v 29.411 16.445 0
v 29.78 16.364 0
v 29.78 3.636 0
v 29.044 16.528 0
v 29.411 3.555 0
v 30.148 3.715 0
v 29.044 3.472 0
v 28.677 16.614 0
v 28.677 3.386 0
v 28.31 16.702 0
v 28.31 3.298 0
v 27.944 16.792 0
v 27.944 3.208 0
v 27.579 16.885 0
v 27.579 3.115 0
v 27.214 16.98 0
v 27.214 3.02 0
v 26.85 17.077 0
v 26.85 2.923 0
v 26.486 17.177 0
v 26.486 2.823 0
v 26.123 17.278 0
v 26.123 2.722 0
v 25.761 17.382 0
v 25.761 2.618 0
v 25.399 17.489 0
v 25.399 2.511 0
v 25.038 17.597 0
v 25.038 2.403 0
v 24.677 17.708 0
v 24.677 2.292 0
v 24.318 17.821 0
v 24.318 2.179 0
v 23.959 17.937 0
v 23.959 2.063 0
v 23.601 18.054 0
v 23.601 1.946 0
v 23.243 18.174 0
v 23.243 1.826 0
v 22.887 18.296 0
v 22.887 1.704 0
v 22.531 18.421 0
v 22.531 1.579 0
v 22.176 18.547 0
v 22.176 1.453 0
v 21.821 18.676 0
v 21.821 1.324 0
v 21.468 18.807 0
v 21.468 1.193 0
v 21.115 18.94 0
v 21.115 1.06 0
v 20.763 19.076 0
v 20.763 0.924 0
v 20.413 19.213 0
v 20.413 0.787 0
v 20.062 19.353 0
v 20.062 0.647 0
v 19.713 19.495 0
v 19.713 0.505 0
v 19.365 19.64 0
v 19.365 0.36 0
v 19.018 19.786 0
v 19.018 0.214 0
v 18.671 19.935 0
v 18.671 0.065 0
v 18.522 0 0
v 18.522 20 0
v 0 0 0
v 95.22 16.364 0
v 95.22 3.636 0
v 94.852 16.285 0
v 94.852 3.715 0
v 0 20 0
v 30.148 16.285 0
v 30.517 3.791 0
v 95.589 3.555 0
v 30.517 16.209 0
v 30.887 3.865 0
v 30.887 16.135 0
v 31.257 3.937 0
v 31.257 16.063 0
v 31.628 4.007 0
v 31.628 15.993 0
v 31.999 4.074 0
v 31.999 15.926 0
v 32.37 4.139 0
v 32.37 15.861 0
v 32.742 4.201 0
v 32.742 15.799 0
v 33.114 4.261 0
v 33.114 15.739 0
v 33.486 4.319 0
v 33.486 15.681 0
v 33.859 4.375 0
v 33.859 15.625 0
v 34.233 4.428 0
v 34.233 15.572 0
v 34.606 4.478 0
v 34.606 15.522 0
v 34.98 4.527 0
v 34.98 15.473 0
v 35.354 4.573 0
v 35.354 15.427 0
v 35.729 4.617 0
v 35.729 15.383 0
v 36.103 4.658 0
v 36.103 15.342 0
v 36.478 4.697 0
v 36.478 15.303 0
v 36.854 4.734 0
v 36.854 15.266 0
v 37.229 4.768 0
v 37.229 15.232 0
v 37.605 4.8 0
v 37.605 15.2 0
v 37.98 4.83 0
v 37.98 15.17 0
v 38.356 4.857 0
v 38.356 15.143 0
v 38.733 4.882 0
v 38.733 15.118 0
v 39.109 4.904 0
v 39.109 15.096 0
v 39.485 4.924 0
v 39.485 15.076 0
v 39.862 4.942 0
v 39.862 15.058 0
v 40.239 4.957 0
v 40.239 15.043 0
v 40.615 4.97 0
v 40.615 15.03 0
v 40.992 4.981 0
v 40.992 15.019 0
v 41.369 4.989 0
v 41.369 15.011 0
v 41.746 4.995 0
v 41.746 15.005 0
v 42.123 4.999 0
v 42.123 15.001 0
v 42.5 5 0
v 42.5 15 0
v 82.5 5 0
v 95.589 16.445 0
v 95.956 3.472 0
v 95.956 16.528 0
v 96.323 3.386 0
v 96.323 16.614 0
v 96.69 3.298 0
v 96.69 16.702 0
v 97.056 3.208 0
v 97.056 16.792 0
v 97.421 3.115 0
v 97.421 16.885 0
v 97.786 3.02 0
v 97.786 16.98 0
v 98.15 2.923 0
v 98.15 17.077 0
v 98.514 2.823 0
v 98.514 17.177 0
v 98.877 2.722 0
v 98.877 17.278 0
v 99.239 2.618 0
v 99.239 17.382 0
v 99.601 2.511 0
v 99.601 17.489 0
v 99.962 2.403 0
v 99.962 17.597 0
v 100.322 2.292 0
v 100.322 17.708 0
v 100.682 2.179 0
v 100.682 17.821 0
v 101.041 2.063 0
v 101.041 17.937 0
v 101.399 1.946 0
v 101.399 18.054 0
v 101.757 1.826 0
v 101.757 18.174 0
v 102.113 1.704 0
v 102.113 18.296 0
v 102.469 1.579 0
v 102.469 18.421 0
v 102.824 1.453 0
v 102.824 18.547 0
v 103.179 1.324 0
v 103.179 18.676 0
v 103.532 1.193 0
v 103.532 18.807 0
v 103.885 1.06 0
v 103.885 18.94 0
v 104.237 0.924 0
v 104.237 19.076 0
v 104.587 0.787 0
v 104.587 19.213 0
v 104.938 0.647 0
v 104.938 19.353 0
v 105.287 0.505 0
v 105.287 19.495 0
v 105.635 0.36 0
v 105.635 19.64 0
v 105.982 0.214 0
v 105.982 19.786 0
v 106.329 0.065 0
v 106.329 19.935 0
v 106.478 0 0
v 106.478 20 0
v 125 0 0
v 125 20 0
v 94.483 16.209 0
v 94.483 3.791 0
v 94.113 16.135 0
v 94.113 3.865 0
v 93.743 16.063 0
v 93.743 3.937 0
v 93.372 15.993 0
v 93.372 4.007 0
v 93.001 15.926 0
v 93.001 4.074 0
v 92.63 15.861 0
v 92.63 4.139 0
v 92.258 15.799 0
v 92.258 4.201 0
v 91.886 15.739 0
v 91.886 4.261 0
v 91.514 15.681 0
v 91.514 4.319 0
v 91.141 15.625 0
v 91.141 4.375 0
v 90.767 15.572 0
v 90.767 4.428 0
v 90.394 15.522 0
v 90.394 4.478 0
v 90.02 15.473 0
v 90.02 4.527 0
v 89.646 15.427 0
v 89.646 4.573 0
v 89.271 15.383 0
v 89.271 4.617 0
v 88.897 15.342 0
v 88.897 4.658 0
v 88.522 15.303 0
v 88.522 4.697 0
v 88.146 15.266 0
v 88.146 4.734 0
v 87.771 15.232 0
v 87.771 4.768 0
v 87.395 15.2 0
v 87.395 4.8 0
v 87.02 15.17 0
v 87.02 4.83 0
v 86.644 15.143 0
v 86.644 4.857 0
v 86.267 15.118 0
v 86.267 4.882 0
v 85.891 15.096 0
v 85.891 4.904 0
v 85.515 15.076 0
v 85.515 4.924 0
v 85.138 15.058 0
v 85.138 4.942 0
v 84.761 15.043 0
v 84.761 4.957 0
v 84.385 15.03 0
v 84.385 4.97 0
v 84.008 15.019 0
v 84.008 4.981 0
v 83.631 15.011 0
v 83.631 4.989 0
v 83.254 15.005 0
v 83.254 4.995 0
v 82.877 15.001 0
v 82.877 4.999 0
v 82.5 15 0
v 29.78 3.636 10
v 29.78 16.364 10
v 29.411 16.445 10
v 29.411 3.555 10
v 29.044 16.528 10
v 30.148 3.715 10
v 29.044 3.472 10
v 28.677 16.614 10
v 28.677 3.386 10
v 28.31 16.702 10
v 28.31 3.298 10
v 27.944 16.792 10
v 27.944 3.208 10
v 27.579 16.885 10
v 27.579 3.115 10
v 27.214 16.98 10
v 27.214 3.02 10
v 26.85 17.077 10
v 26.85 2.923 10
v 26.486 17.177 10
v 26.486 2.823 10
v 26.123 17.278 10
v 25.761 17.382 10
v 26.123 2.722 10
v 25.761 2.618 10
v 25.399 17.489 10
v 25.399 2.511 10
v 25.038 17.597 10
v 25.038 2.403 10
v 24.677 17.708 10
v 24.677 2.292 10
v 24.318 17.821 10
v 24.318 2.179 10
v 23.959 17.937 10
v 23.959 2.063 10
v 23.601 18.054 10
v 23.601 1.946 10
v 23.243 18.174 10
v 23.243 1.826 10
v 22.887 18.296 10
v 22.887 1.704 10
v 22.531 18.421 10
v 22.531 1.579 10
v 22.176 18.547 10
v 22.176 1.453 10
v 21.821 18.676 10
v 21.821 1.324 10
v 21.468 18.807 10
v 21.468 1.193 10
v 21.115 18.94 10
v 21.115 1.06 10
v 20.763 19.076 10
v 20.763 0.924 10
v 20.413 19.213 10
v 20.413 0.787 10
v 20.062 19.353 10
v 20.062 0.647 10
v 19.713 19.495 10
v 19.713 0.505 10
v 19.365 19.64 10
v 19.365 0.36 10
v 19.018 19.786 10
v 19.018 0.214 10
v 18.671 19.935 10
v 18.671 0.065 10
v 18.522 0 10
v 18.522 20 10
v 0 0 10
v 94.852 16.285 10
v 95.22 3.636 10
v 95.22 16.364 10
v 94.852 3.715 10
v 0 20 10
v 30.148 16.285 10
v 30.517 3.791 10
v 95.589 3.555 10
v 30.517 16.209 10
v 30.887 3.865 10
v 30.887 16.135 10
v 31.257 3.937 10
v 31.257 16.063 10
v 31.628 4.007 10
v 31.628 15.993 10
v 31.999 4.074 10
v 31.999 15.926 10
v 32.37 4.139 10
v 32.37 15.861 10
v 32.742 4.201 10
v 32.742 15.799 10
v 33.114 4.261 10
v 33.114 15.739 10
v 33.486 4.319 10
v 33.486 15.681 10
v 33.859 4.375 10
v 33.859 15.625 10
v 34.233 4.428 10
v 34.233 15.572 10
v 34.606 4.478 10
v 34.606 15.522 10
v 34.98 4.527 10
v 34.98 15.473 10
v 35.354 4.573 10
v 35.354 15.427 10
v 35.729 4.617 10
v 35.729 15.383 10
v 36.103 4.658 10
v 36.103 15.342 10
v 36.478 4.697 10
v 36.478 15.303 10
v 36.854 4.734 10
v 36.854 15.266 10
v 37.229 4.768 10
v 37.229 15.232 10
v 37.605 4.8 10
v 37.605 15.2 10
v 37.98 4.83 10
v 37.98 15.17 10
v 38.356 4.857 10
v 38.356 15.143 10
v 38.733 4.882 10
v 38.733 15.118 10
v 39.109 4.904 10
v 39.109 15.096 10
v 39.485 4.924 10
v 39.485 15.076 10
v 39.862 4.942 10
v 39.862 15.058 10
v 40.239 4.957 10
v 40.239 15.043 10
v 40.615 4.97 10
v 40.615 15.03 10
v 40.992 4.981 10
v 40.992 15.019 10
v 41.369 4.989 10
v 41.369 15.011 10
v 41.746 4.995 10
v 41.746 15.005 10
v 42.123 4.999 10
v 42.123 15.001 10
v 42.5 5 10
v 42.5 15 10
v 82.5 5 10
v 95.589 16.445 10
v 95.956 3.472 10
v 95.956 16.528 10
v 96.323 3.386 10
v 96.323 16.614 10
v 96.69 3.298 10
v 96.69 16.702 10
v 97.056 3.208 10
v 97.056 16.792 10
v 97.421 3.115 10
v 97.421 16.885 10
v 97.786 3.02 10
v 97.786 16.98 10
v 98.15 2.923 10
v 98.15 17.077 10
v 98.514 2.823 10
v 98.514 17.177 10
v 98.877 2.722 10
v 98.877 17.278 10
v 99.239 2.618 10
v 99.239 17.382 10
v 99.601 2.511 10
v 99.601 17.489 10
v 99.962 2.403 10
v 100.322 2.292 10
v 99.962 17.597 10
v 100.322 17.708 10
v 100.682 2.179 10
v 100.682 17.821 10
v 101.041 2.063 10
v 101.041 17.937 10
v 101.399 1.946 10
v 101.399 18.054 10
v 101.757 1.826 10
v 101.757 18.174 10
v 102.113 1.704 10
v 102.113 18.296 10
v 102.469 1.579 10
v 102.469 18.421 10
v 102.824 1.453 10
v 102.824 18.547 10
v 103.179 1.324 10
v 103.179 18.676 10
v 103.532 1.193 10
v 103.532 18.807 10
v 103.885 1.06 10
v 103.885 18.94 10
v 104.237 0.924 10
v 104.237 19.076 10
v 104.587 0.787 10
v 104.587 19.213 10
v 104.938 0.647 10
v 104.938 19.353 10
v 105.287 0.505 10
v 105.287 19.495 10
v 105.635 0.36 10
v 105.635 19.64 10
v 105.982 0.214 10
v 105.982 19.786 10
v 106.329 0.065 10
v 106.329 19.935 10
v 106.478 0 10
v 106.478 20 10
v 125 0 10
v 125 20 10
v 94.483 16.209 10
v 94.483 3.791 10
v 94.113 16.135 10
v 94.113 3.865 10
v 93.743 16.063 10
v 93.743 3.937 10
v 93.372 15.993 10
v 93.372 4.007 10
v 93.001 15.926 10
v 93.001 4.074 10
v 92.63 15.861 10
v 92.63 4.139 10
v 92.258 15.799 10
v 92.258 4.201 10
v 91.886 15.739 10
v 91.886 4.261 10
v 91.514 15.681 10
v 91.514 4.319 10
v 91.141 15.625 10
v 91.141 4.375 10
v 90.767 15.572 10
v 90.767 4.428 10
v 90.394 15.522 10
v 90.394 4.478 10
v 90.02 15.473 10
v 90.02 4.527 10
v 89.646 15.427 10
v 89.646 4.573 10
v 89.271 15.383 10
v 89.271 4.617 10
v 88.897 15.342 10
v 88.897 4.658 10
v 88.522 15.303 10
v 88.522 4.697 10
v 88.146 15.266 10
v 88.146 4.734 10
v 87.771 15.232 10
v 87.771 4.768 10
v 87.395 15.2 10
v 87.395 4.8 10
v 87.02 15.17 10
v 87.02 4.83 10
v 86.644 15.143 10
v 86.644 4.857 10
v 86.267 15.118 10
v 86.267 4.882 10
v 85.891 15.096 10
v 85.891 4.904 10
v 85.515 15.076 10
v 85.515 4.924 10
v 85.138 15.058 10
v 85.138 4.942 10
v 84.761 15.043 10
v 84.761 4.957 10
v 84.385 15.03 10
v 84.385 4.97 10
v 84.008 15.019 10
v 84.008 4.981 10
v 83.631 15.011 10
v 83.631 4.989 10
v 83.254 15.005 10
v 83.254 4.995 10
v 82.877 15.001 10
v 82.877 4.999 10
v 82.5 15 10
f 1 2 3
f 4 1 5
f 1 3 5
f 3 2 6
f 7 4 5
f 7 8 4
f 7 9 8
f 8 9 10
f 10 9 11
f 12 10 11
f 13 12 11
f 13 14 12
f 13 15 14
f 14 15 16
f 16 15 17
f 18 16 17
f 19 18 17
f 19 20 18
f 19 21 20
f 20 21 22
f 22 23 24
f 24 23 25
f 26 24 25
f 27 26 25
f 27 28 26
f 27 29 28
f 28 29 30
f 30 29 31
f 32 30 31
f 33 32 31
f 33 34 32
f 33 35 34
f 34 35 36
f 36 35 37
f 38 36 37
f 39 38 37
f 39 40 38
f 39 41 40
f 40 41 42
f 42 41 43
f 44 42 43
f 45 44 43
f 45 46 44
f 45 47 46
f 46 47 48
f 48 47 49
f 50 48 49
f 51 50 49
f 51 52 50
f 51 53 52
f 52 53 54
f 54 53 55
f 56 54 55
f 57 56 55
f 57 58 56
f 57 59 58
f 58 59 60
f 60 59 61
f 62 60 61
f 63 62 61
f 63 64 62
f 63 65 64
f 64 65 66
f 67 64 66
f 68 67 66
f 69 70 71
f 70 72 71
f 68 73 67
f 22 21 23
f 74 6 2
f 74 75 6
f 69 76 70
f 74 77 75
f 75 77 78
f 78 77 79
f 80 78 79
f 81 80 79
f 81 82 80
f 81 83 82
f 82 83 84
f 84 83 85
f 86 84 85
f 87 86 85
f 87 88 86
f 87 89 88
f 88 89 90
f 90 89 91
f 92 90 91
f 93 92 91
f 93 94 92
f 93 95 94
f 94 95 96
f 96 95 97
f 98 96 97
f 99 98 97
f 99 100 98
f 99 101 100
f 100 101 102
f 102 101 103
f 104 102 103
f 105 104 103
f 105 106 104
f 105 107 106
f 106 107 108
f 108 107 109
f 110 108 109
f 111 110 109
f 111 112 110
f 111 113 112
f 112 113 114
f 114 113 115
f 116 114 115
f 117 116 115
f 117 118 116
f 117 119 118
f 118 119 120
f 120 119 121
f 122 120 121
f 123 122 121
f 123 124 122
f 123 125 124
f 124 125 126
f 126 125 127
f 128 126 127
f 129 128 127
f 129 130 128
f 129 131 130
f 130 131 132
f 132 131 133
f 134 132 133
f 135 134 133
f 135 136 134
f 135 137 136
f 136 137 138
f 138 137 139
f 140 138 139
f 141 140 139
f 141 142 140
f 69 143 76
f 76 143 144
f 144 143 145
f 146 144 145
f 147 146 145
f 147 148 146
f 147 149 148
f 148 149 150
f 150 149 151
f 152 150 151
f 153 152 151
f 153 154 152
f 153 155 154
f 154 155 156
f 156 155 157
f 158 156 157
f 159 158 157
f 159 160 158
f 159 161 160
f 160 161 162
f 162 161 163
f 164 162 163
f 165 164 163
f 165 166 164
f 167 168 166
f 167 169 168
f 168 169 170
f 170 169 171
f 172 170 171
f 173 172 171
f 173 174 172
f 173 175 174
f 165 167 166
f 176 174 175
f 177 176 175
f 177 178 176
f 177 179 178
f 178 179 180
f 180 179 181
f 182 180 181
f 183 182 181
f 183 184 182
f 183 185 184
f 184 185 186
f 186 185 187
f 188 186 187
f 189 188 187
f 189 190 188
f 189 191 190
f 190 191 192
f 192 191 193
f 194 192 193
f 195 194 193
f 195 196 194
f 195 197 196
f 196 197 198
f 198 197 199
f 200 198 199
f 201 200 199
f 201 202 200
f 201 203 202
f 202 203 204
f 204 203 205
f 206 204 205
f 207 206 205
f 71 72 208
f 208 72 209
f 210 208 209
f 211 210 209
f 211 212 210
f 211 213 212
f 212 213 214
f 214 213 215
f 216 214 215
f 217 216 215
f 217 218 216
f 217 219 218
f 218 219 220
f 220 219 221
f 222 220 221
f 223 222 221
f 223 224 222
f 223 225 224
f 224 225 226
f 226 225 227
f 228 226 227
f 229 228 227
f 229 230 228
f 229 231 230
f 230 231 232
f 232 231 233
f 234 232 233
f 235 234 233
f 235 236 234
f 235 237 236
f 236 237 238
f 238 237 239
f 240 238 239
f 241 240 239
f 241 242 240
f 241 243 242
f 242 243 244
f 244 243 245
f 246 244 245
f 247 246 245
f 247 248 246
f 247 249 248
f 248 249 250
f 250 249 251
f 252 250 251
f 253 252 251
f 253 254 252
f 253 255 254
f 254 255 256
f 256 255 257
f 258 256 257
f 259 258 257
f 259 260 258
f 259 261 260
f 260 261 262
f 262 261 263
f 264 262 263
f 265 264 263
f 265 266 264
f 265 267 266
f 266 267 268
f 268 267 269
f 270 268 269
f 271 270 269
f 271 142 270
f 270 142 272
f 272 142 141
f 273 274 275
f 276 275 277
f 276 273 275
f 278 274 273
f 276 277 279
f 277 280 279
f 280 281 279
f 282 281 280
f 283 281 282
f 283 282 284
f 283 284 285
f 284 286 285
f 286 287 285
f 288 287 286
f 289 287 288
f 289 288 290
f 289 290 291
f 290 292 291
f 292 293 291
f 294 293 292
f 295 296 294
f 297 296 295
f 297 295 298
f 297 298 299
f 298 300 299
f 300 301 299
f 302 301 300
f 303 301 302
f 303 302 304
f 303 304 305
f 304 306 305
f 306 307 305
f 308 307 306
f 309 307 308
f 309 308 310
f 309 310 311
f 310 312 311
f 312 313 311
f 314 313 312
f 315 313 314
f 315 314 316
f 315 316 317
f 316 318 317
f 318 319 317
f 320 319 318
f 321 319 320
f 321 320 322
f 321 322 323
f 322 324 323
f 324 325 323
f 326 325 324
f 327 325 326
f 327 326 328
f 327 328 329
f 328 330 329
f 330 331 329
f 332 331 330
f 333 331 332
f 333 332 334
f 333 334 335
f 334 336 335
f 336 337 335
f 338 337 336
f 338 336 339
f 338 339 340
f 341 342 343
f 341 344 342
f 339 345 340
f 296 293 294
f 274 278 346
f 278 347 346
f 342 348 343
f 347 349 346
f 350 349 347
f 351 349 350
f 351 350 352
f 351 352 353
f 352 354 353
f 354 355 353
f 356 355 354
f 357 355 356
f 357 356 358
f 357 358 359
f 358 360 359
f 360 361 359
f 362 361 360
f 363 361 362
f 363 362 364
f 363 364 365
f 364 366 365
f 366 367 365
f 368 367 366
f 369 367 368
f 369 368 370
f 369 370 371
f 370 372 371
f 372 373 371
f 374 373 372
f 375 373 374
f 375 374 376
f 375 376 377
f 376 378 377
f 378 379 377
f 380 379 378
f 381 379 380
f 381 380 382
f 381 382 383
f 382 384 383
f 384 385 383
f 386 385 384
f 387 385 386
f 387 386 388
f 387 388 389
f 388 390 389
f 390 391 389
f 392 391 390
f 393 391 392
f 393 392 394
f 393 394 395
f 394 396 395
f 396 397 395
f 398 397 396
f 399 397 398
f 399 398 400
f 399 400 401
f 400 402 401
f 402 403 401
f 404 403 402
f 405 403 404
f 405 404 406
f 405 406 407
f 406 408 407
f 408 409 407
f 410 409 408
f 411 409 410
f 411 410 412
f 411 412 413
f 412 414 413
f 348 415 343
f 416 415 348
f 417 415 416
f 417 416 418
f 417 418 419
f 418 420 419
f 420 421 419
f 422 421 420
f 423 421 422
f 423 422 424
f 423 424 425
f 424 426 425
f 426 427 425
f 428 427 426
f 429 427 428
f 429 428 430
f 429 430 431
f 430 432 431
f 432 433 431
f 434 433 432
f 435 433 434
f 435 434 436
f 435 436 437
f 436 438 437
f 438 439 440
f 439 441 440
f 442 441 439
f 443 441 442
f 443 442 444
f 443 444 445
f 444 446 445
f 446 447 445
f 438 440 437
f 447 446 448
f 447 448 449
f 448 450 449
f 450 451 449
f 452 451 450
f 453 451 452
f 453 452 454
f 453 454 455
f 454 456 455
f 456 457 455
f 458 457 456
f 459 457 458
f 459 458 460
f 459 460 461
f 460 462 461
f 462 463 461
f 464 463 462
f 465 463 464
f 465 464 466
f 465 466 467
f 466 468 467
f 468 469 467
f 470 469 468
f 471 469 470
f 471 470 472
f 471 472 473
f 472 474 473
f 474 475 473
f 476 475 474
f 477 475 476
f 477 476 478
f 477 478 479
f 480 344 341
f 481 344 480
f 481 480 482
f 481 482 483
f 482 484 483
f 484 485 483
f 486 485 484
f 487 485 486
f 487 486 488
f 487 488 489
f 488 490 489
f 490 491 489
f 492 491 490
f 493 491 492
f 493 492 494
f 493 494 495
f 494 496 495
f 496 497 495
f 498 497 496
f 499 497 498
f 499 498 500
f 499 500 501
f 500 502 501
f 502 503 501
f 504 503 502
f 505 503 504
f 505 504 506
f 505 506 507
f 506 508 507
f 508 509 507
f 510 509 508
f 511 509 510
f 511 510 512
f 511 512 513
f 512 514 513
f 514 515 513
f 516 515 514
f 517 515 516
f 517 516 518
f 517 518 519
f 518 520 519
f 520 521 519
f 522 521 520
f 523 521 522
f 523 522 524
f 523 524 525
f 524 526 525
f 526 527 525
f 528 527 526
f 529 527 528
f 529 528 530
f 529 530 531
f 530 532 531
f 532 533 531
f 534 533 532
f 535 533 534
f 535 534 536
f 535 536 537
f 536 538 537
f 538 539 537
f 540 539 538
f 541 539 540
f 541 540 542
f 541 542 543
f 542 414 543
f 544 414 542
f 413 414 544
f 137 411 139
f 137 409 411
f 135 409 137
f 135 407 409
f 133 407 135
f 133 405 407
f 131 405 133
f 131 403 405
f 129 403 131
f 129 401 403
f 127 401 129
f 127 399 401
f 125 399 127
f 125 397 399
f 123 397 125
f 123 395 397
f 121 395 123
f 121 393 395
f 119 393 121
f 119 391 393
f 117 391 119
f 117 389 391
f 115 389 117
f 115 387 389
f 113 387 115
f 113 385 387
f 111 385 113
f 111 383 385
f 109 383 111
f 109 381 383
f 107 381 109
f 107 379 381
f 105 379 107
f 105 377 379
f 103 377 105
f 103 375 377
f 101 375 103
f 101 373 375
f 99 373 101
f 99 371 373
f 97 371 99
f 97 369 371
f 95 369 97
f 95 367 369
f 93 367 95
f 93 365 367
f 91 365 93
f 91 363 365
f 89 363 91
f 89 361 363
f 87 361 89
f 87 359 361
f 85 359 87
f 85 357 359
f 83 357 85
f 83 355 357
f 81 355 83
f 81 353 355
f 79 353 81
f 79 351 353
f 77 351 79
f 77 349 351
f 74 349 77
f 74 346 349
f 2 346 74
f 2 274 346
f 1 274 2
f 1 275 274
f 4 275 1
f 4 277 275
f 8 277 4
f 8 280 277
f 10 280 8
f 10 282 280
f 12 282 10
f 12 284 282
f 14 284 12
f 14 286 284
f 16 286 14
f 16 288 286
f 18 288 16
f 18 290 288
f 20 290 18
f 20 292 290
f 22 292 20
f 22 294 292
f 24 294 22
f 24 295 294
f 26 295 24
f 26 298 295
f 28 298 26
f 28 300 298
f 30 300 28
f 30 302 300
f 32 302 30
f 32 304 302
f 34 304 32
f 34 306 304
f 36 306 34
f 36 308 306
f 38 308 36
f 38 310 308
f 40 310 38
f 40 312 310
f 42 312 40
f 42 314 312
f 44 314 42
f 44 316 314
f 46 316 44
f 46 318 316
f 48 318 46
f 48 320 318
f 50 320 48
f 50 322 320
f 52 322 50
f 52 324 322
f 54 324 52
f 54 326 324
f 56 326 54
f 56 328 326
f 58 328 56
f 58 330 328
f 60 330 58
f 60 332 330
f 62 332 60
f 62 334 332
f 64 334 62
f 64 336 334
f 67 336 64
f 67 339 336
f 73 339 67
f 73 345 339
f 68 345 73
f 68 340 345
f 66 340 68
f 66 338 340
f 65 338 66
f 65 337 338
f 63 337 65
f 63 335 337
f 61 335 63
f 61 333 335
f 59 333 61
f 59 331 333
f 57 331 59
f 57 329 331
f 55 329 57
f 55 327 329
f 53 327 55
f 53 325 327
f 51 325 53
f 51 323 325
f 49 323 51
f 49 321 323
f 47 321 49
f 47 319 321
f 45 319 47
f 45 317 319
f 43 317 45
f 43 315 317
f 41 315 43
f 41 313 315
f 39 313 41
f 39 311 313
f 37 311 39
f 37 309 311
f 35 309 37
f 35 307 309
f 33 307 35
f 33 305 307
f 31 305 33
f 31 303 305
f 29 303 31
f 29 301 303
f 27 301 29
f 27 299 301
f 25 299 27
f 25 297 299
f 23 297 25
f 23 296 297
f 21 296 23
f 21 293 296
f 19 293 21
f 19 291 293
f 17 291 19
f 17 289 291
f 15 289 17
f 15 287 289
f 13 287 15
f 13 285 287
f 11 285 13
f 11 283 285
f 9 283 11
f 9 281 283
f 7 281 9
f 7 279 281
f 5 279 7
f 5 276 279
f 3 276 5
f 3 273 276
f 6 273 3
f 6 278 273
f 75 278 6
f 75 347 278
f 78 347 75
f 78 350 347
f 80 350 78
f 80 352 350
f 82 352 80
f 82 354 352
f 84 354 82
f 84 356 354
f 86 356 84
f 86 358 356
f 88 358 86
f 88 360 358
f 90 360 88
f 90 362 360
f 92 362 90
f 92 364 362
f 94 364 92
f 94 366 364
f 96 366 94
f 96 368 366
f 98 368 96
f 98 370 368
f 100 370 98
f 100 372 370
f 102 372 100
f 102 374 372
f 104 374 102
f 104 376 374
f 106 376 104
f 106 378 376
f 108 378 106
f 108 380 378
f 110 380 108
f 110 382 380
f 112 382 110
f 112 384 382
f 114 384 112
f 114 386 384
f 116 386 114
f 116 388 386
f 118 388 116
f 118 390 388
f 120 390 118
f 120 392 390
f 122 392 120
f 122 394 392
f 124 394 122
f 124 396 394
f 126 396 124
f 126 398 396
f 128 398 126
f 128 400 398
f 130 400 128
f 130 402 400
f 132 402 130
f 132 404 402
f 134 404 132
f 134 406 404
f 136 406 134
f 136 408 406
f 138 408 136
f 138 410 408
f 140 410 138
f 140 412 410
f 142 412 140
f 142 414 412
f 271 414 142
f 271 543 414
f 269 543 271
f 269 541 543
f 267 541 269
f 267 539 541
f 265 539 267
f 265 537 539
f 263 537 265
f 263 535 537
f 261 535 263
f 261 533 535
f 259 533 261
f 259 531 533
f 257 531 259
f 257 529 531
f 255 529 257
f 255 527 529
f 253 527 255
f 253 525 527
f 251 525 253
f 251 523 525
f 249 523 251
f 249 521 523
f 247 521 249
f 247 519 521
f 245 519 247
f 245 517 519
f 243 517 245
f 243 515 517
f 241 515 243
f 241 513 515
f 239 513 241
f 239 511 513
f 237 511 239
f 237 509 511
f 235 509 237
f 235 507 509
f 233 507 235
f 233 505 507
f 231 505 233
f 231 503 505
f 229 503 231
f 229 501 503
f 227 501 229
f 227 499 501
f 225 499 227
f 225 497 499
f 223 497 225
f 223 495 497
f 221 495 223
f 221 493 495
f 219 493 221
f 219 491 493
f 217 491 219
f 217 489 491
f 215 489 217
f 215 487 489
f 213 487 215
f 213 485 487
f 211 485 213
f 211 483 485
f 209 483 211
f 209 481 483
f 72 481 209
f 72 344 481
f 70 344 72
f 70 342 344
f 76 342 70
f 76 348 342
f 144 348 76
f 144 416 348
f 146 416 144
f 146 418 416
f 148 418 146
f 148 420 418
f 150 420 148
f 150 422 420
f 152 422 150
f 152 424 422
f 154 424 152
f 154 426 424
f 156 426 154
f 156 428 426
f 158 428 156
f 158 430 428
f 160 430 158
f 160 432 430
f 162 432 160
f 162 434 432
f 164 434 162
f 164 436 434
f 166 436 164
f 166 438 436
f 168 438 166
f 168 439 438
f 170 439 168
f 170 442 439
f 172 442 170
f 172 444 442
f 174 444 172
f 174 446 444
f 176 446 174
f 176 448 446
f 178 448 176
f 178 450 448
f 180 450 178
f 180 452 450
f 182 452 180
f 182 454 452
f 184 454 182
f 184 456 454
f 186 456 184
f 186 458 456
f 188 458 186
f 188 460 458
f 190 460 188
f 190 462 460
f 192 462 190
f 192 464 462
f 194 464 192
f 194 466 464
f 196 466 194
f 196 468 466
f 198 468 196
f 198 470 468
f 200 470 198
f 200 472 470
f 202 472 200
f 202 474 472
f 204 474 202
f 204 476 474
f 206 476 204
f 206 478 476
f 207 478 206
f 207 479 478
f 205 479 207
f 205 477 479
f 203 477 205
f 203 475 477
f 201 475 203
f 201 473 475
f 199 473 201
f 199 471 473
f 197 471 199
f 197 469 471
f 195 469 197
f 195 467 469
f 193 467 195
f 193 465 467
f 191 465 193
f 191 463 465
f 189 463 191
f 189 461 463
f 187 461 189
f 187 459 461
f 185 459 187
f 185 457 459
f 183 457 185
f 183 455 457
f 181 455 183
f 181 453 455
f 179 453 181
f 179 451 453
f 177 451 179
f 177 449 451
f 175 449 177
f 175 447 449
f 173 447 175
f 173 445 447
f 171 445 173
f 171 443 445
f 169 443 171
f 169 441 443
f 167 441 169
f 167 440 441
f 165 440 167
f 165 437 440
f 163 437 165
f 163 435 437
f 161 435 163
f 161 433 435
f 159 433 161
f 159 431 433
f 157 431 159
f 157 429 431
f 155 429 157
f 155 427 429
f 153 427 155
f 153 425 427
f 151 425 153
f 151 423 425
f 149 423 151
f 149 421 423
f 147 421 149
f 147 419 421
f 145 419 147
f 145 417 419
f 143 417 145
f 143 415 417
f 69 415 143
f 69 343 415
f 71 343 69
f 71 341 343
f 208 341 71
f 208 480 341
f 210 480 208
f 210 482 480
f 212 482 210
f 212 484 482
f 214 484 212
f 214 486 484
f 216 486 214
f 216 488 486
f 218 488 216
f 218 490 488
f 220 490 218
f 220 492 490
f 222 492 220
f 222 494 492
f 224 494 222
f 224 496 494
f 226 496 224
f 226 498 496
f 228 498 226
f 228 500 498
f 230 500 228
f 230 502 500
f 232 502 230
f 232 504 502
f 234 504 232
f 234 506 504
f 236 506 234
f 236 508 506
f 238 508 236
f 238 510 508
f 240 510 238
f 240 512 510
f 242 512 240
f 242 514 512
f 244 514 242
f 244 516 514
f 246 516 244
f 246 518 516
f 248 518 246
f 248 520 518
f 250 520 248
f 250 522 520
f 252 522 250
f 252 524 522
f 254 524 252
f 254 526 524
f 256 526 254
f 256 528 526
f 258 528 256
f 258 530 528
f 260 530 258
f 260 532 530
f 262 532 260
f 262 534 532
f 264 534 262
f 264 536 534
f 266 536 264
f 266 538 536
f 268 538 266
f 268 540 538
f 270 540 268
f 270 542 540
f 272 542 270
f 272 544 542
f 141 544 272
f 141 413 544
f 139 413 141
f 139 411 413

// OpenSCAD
// file: iso3167.scad
iso3167_A = [
    "l1", 80,
    "l2", (104+113)/2,
    "l3", 170,
    "b1", 10,
    "b2", 20.0,
    "r", 24,
    "h", 4.0
];

iso3167_B = [
    "l1", 60.0,
    "l2", (106+110)/2,
    "l3", 150,
    "b1", 10,
    "b2", 20.0,
    "r", 60.0,
    "h", 4.0
];

function hash(h, k)=
(
    h[search([k], [for(i=[0:2:len(h)-2])h[i]])[0]*2+1]
);

module iso3167(
    l1 = undef,
    l2 = undef,
    l3 = undef,
    b1 = undef,
    b2 = undef,
    r = undef,
    h = undef,
    type = "A") {

    m_l1 = (l1 != undef) ? l1 : (type=="A" ? hash(iso3167_A,"l1") : type=="B" ? hash(iso3167_B, "l1") : undef);
    m_l2_max = (l2 != undef) ? l2 : (type=="A" ? hash(iso3167_A,"l2") : type=="B" ? hash(iso3167_B, "l2") : undef);
    m_l3 = (l3 != undef) ? l3 : (type=="A" ? hash(iso3167_A,"l3") : type=="B" ? hash(iso3167_B, "l3") : undef);
    m_b1 = (b1 != undef) ? b1 : (type=="A" ? hash(iso3167_A,"b1") : type=="B" ? hash(iso3167_B, "b1") : undef);
    m_b2 = (b2 != undef) ? b2 : (type=="A" ? hash(iso3167_A,"b2") : type=="B" ? hash(iso3167_B, "b2") : undef);
    m_r = (r != undef) ? r : (type=="A" ? hash(iso3167_A,"r") : type=="B" ? hash(iso3167_B, "r") : undef);
    m_h = (h != undef) ? h : (type=="A" ? hash(iso3167_A,"h") : type=="B" ? hash(iso3167_B, "h") : undef);

    neck_cut_width = (m_b2 - m_b1)/2;

    theta = acos((m_r - neck_cut_width)/m_r);
    fillet_width = sin(theta);
    m_l2 = ((m_l2_max - m_l1)/2 >= fillet_width) ? m_l2_max : m_l3 - 2*fillet_width ;

    neck_cut_xoff = (m_l3 - m_l1)/2;
    neck_cut_yoff = (m_b2 - neck_cut_width);

    neck_fillet_xoff1 = neck_cut_xoff;
    neck_fillet_xoff2 = m_l3 - neck_cut_xoff;
    neck_fillet_yoff1 = -m_r + neck_cut_width;
    neck_fillet_yoff2 = neck_cut_yoff + m_r;


    linear_extrude(height=m_h) {
        difference() {
            // Bounding rectangle
            square([m_l3, m_b2]);

            // Neck area
            translate([neck_cut_xoff, 0])
                square([m_l1, neck_cut_width]);
            translate([neck_cut_xoff, neck_cut_yoff])
                square([m_l1, neck_cut_width]);


            translate([neck_fillet_xoff1, neck_fillet_yoff1])
                circle(r=m_r);
            translate([neck_fillet_xoff1, neck_fillet_yoff2])
                circle(r=m_r);
            translate([neck_fillet_xoff2, neck_fillet_yoff1])
                circle(r=m_r);
            translate([neck_fillet_xoff2, neck_fillet_yoff2])
                circle(r=m_r);
        }
    }
};

module iso3167_clamp(
    l1 = undef,
    l2 = undef,
    l3 = undef,
    b1 = undef,
    b2 = undef,
    r = undef,
    h = undef,
    depth = undef,
    width = undef,
    outer_width = undef,
    outer_depth = undef,
    tri_width = undef,
    tol = 0.3,
    hole_dia = 3.2,
    nut_width = 5.5,
    nut_depth = 3,
    type = "A") {


    m_l1 = (l1 != undef) ? l1 : (type=="A" ? hash(iso3167_A,"l1") : type=="B" ? hash(iso3167_B, "l1") : undef);
    m_l2_max = (l2 != undef) ? l2 : (type=="A" ? hash(iso3167_A,"l2") : type=="B" ? hash(iso3167_B, "l2") : undef);
    m_l3 = (l3 != undef) ? l3 : (type=="A" ? hash(iso3167_A,"l3") : type=="B" ? hash(iso3167_B, "l3") : undef);
    m_b1 = (b1 != undef) ? b1 : (type=="A" ? hash(iso3167_A,"b1") : type=="B" ? hash(iso3167_B, "b1") : undef);
    m_b2 = (b2 != undef) ? b2 : (type=="A" ? hash(iso3167_A,"b2") : type=="B" ? hash(iso3167_B, "b2") : undef);
    m_r = (r != undef) ? r : (type=="A" ? hash(iso3167_A,"r") : type=="B" ? hash(iso3167_B, "r") : undef);
    m_h = (h != undef) ? h : (type=="A" ? hash(iso3167_A,"h") : type=="B" ? hash(iso3167_B, "h") : undef);

    neck_cut_width = (m_b2 - m_b1)/2;

    theta = acos((m_r - neck_cut_width)/m_r);
    fillet_width = sin(theta);
    m_l2 = ((m_l2_max - m_l1)/2 >= fillet_width) ? m_l2_max : m_l3 - 2*fillet_width ;

    m_depth = (depth != undef) ? depth : (m_l3 - m_l2)/1;
    m_width = (width != undef) ? width :  m_b2 + tol*2;
    m_outer_depth = (outer_depth != undef) ? outer_depth : m_b2 * 2;
    m_outer_width = (outer_width != undef) ? outer_width : m_width * 3;
    m_tri_width = (tri_width != undef) ? tri_width :  m_b2;
    m_tri_depth = m_tri_width / 2;

    echo(m_depth);

    difference() {
        linear_extrude(height=m_h) {
            difference() {
                square([m_outer_width, m_outer_depth]);

                translate([(m_outer_width - m_width)/2, m_outer_depth - m_depth])
                    square([m_width, m_depth]);

                translate([m_outer_width/2, (m_outer_depth - m_depth)/2])
                    polygon(points=[
                        [-m_tri_width/2, m_tri_depth/2],
                        [m_tri_width/2, m_tri_depth/2],
                        [0, -m_tri_depth/2]]);
            }
        }

        translate([0, m_outer_depth - m_depth/2, m_h/2])
            rotate([0, 90, 0])
                union() {
                    translate([0,0,-0.0001])
                        cylinder(d=hole_dia, h=m_outer_width + 0.0002);

                    translate([0,0, (m_outer_width - m_width)/2 - nut_depth + 0.0001])
                        cylinder(r=nut_width/2/cos(180/6) + 0.05, h=nut_depth, $fn=6);

                    translate([0,0, m_outer_width - (m_outer_width - m_width)/2 - 0.0001])
                        cylinder(r=nut_width/2/cos(180/6) + 0.05, h=nut_depth, $fn=6);
                }
    }
}
// main file
include <iso3167.scad>

$fn = 1000;
iso3167(type="B", h=10, l3=125, l1=40);
